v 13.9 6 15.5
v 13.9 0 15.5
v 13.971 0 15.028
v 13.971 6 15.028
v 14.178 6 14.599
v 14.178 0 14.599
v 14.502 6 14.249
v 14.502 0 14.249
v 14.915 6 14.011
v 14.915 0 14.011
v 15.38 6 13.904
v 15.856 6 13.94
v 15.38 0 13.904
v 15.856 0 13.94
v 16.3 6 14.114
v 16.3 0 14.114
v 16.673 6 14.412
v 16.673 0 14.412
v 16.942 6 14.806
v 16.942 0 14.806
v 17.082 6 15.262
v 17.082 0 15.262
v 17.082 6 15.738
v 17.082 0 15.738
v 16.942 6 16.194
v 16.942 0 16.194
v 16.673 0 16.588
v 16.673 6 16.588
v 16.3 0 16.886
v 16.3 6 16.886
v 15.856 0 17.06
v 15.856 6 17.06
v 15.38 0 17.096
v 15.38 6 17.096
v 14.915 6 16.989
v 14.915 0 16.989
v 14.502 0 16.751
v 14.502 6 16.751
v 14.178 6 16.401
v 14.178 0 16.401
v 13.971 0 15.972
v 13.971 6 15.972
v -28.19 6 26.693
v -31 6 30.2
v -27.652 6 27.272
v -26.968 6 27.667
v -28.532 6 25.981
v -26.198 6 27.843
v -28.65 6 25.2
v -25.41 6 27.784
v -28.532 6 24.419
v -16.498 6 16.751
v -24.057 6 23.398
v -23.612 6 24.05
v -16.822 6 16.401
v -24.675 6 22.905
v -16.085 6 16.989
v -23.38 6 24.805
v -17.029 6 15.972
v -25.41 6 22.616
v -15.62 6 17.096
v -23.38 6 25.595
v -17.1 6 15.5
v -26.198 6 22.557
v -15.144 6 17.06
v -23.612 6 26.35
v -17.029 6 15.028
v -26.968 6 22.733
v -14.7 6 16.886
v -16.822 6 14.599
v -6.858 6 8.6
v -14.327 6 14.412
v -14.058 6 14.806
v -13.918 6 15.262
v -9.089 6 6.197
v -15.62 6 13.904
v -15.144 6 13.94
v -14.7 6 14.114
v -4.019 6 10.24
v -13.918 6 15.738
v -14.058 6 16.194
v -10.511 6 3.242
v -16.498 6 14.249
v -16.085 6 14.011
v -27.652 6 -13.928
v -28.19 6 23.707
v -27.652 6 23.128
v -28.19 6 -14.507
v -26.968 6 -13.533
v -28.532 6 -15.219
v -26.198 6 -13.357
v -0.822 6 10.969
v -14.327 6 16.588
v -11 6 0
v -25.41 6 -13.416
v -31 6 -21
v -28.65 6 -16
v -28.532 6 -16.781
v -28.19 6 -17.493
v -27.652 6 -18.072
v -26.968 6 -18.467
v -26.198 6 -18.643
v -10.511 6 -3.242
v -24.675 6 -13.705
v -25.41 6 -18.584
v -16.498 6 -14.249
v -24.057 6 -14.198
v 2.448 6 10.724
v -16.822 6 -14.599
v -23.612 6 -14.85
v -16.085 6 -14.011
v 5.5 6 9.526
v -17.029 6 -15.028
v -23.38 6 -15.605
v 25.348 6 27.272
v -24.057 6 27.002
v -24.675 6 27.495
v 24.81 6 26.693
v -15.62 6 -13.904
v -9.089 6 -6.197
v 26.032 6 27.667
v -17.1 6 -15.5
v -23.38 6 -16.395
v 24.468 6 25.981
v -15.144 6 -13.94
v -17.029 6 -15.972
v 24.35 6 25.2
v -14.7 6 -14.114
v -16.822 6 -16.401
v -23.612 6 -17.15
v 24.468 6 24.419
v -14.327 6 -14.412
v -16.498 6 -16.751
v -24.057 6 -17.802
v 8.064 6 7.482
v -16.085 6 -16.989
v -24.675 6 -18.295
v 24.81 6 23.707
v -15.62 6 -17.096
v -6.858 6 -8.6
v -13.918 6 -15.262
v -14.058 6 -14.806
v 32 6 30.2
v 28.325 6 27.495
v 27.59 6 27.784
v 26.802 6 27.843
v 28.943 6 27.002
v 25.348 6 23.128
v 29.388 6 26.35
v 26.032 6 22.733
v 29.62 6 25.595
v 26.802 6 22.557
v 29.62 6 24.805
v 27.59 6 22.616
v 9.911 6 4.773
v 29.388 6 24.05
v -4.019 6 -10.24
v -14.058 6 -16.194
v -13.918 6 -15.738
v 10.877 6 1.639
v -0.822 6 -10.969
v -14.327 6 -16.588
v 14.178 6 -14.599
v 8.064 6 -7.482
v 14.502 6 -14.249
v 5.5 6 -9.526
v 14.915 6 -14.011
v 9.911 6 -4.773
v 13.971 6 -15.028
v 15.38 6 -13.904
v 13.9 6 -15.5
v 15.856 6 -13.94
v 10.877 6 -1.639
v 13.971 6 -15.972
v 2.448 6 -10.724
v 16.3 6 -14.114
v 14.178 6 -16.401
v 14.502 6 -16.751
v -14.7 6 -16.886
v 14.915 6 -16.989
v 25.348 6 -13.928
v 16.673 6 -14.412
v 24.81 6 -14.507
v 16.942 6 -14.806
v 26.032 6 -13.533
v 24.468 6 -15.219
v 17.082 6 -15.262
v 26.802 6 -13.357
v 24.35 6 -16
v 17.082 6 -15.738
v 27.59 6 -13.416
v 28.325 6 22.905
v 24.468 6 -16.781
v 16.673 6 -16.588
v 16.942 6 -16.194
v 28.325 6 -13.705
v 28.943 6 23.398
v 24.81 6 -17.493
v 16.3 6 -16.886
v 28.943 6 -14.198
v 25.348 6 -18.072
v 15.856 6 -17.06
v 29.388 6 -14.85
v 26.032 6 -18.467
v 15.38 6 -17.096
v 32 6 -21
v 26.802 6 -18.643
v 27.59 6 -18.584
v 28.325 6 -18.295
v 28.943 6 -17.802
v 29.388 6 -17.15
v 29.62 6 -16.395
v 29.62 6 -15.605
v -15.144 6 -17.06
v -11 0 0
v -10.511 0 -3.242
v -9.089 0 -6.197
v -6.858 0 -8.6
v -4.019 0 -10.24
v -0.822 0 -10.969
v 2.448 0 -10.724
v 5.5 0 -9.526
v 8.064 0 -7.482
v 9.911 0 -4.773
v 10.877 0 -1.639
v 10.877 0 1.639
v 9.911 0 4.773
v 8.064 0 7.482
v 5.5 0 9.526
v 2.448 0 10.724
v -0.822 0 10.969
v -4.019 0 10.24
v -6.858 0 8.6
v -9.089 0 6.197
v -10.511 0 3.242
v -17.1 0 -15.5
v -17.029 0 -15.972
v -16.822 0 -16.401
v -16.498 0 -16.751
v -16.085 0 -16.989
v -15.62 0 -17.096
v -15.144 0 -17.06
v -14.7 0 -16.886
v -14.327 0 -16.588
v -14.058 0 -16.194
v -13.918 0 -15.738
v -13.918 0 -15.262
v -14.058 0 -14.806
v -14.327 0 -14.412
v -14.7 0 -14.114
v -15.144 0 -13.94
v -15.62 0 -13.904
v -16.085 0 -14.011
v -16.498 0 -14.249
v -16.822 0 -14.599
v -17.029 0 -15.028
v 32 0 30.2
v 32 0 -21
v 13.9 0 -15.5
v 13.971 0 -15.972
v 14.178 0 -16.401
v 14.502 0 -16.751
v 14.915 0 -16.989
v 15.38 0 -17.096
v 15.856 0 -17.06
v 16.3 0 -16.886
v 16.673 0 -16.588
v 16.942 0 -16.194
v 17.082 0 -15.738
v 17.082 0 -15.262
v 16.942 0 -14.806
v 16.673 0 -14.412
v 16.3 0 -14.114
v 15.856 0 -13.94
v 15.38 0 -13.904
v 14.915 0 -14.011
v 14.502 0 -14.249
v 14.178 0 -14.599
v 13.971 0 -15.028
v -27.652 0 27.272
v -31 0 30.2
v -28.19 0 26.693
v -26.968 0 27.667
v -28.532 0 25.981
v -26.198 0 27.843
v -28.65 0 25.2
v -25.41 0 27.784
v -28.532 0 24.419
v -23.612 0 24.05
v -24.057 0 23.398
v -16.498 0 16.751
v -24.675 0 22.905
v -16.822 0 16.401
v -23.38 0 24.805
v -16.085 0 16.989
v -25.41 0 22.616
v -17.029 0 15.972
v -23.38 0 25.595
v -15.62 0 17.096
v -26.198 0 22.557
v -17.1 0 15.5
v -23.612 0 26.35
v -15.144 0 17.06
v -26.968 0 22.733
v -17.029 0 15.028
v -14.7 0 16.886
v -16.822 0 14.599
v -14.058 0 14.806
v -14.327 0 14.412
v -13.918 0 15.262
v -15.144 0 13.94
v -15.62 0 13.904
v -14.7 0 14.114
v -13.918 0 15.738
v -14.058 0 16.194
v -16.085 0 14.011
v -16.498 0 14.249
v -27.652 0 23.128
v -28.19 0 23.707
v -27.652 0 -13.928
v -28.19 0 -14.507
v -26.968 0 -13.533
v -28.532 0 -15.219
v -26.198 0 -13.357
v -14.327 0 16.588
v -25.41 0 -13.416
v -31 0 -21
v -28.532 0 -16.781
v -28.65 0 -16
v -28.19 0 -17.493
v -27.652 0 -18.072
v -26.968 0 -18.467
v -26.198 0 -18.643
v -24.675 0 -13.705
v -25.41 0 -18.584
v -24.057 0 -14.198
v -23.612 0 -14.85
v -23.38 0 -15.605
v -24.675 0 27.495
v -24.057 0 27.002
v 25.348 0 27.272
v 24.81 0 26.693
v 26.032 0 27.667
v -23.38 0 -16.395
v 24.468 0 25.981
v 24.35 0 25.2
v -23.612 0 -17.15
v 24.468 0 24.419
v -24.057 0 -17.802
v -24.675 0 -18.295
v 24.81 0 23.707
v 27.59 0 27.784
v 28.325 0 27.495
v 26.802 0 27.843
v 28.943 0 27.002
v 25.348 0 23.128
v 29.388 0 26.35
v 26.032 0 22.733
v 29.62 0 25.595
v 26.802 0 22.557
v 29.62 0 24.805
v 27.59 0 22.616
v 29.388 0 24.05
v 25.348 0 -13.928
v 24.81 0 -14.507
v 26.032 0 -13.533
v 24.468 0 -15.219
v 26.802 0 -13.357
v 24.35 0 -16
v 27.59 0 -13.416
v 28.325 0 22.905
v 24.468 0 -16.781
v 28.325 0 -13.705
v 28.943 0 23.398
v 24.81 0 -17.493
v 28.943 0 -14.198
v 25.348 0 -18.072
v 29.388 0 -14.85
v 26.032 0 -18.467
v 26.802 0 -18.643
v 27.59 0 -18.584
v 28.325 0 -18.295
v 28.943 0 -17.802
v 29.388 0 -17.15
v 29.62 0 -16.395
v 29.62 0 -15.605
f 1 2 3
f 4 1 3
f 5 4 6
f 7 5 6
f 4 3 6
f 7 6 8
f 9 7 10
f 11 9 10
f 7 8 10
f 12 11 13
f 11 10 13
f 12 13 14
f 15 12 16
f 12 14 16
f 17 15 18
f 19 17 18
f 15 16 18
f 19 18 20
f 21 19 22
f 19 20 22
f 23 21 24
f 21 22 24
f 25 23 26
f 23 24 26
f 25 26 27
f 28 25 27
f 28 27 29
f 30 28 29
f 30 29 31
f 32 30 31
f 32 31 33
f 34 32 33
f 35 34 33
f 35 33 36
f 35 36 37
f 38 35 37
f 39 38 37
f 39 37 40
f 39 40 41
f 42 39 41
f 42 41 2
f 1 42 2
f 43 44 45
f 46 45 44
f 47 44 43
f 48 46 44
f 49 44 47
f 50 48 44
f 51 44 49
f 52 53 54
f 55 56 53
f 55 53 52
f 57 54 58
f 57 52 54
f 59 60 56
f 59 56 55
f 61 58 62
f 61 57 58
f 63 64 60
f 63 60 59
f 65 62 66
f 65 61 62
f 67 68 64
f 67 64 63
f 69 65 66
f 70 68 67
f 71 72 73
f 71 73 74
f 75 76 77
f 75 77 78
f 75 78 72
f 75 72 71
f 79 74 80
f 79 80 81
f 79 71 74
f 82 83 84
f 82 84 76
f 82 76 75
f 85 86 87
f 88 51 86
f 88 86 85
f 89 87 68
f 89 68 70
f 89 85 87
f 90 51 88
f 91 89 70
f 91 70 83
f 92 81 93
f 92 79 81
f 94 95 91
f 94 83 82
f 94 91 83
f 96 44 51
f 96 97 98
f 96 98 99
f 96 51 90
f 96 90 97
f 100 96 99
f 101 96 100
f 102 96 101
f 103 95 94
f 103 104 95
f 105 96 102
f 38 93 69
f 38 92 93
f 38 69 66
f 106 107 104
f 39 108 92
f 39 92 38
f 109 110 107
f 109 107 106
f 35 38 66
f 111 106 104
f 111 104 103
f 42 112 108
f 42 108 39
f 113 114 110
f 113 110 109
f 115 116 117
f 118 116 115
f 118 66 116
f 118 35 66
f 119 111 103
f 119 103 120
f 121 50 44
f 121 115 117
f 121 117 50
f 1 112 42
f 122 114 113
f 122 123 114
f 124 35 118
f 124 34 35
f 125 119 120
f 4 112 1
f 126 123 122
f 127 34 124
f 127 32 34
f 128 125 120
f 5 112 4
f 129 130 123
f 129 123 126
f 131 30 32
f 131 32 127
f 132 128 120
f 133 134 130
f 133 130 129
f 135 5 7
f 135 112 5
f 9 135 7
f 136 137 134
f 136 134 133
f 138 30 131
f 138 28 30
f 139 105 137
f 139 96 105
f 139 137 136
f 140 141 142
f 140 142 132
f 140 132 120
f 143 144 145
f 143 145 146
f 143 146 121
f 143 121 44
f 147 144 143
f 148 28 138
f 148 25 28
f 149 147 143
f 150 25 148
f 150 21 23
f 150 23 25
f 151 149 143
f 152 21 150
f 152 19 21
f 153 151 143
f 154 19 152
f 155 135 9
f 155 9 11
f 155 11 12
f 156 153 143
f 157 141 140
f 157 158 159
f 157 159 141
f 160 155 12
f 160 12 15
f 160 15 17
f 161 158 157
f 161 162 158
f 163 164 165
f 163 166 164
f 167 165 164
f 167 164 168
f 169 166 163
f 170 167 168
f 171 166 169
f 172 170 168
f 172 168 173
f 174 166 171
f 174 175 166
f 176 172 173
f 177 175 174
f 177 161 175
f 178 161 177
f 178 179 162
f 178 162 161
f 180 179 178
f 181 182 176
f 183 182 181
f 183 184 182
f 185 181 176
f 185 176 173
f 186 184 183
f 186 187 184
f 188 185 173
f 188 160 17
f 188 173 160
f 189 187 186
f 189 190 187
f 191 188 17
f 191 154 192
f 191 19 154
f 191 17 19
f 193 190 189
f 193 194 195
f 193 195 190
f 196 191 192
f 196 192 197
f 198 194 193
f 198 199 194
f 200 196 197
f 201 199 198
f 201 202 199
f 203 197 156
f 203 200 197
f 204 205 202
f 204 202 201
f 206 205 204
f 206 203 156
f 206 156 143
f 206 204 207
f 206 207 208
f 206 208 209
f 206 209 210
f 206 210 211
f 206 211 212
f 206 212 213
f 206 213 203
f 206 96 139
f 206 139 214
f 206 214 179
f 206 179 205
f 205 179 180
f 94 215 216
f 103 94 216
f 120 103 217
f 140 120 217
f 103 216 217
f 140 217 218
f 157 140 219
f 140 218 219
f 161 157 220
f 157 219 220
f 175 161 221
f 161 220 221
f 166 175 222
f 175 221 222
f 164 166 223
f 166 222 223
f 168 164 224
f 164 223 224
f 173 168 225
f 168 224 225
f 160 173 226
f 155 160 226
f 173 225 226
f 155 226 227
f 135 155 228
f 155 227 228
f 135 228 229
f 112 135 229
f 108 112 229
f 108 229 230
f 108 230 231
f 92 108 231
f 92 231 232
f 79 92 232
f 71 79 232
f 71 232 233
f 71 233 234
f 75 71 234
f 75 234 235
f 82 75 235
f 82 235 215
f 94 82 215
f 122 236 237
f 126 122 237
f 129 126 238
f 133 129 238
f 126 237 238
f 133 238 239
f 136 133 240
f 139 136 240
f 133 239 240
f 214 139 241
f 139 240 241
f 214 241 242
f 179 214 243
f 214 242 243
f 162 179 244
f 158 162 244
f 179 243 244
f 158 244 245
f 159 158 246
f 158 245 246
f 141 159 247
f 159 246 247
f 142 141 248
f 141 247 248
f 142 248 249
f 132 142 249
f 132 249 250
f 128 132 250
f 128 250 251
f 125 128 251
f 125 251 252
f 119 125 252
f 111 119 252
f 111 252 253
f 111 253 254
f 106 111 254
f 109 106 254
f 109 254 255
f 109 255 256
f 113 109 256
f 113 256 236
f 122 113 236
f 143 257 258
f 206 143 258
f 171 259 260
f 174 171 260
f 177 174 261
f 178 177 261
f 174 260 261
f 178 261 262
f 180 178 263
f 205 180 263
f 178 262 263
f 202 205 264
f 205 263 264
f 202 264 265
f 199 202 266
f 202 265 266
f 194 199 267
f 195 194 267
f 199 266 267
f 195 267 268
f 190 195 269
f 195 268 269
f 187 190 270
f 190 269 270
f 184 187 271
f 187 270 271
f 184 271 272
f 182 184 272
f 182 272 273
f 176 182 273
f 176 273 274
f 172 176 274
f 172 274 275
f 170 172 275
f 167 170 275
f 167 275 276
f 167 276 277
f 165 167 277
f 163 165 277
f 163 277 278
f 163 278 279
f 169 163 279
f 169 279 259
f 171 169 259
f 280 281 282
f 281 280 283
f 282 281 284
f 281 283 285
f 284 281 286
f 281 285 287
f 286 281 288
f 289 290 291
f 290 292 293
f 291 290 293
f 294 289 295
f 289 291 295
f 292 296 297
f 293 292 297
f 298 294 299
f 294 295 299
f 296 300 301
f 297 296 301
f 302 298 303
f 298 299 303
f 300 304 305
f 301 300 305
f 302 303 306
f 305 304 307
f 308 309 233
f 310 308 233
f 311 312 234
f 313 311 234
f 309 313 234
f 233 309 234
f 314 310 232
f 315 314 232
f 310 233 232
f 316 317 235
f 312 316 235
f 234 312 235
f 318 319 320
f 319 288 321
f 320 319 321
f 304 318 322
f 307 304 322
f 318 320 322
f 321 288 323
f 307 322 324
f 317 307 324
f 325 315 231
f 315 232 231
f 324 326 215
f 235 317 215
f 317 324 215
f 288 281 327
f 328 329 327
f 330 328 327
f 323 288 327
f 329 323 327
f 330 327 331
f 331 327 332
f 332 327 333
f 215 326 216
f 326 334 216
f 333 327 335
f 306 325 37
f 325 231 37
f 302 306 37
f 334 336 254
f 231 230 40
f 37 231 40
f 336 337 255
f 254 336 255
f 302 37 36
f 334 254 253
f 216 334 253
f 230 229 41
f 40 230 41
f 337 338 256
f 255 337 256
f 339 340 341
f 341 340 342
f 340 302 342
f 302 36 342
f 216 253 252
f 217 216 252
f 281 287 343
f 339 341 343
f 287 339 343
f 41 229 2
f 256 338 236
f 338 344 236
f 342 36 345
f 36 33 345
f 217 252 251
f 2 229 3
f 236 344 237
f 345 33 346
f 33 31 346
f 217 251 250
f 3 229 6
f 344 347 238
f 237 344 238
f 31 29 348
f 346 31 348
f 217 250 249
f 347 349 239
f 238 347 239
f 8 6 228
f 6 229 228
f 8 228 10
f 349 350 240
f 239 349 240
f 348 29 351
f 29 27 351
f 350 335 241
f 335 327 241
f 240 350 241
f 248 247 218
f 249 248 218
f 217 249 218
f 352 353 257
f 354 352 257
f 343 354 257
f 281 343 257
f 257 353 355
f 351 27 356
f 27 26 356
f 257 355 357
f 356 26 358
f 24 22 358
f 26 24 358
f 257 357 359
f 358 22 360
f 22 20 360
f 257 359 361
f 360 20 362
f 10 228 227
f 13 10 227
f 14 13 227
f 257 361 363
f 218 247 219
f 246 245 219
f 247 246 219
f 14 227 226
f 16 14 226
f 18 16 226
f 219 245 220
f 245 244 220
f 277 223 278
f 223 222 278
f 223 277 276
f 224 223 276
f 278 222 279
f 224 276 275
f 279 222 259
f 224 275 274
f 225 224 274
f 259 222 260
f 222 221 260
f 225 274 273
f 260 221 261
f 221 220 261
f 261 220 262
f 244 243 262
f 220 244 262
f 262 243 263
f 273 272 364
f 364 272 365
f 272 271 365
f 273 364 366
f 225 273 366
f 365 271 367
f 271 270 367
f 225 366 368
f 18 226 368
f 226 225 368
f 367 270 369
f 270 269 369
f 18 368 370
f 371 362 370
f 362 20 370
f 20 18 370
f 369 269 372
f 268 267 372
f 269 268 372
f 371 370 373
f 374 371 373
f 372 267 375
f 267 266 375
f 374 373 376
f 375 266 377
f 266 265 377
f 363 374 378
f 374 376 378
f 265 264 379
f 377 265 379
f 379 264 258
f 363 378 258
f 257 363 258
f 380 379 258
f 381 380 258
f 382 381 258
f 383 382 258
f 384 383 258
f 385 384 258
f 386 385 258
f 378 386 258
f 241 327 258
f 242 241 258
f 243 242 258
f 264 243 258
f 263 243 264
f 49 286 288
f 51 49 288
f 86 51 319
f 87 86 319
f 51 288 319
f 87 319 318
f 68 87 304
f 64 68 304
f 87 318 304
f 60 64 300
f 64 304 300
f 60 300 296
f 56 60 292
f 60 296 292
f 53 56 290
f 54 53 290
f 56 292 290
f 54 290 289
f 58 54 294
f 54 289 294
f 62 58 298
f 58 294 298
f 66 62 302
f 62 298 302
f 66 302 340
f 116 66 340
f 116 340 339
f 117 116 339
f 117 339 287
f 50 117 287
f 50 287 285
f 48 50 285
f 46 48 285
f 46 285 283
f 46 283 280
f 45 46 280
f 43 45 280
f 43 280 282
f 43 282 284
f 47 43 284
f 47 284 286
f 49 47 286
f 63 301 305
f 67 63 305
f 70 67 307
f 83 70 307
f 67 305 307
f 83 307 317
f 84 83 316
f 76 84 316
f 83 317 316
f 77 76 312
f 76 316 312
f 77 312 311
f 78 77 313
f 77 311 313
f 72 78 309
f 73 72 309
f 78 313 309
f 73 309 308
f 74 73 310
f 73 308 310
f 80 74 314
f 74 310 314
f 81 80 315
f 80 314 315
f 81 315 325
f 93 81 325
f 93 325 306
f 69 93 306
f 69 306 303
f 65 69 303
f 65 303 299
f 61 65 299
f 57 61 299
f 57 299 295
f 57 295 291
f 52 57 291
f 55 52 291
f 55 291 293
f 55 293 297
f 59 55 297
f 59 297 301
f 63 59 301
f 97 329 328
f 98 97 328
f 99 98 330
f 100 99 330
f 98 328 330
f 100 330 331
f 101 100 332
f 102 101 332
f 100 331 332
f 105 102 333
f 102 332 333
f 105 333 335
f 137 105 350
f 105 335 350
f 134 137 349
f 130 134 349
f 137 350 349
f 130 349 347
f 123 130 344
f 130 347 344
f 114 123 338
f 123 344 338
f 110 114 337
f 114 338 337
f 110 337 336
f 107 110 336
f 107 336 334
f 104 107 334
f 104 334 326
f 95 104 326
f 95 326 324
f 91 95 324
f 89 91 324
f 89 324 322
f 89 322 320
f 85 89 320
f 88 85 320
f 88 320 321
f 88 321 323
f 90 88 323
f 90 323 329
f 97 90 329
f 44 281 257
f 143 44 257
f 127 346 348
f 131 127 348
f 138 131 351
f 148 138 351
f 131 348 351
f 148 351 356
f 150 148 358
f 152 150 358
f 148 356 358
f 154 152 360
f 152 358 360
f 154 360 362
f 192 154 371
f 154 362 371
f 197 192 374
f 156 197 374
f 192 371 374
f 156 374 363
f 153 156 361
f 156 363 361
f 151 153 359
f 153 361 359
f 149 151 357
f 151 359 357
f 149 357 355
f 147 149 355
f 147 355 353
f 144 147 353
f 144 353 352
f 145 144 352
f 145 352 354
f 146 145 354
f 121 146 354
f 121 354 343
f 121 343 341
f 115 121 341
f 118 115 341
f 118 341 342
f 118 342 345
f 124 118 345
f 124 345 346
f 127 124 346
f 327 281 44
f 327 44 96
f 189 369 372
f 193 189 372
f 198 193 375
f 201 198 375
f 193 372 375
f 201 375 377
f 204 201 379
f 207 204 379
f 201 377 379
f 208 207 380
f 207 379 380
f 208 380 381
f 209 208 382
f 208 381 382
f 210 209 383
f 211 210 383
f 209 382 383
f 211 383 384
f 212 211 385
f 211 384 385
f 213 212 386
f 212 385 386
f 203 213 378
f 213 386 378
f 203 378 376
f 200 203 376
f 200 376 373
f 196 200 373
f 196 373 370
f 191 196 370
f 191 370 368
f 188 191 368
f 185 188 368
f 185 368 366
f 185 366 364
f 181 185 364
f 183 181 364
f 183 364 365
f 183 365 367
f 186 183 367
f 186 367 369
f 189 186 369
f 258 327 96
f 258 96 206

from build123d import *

# Parameters (mm, degrees)
SKETCH1_W                  = 63
SKETCH1_H                  = 51.2
BOSS_EXTRUDE1_DEPTH        = 6
M5_CLEARANCE_HOLE1_D       = 5.3
M3_CLEARANCE_HOLE1_D       = 3.2
F_22_0_22_DIAMETER_HOLE1_D = 22


with BuildPart() as part:
    # Sketch1 → Boss-Extrude1 (new body)
    with BuildSketch(Plane(origin=(0, 0, 0), x_dir=(1, 0, 0), z_dir=(0, 1, 0))):
        with Locations((0.5, -4.6)):
            Rectangle(SKETCH1_W, SKETCH1_H)
    extrude(amount=BOSS_EXTRUDE1_DEPTH)

    # M5 Clearance Hole1 (through all)
    with Locations(Plane(origin=(0, 6, 0), x_dir=(1, 0, 0), z_dir=(0, 1, 0))):
        with Locations((-26, 16), (-26, -25.2), (27, -25.2), (27, 16)):
            Hole(M5_CLEARANCE_HOLE1_D / 2)

    # M3 Clearance Hole1 (through all)
    with Locations(Plane(origin=(0, 6, 0), x_dir=(1, 0, 0), z_dir=(0, 1, 0))):
        with Locations((-15.5, 15.5), (15.5, 15.5), (15.5, -15.5), (-15.5, -15.5)):
            Hole(M3_CLEARANCE_HOLE1_D / 2)

    # Ø22.0 (22) Diameter Hole1 (through all)
    with Locations(Plane(origin=(0, 6, 0), x_dir=(1, 0, 0), z_dir=(0, 1, 0))):
        with Locations((0, 0)):
            Hole(F_22_0_22_DIAMETER_HOLE1_D / 2)


solid = part.part
